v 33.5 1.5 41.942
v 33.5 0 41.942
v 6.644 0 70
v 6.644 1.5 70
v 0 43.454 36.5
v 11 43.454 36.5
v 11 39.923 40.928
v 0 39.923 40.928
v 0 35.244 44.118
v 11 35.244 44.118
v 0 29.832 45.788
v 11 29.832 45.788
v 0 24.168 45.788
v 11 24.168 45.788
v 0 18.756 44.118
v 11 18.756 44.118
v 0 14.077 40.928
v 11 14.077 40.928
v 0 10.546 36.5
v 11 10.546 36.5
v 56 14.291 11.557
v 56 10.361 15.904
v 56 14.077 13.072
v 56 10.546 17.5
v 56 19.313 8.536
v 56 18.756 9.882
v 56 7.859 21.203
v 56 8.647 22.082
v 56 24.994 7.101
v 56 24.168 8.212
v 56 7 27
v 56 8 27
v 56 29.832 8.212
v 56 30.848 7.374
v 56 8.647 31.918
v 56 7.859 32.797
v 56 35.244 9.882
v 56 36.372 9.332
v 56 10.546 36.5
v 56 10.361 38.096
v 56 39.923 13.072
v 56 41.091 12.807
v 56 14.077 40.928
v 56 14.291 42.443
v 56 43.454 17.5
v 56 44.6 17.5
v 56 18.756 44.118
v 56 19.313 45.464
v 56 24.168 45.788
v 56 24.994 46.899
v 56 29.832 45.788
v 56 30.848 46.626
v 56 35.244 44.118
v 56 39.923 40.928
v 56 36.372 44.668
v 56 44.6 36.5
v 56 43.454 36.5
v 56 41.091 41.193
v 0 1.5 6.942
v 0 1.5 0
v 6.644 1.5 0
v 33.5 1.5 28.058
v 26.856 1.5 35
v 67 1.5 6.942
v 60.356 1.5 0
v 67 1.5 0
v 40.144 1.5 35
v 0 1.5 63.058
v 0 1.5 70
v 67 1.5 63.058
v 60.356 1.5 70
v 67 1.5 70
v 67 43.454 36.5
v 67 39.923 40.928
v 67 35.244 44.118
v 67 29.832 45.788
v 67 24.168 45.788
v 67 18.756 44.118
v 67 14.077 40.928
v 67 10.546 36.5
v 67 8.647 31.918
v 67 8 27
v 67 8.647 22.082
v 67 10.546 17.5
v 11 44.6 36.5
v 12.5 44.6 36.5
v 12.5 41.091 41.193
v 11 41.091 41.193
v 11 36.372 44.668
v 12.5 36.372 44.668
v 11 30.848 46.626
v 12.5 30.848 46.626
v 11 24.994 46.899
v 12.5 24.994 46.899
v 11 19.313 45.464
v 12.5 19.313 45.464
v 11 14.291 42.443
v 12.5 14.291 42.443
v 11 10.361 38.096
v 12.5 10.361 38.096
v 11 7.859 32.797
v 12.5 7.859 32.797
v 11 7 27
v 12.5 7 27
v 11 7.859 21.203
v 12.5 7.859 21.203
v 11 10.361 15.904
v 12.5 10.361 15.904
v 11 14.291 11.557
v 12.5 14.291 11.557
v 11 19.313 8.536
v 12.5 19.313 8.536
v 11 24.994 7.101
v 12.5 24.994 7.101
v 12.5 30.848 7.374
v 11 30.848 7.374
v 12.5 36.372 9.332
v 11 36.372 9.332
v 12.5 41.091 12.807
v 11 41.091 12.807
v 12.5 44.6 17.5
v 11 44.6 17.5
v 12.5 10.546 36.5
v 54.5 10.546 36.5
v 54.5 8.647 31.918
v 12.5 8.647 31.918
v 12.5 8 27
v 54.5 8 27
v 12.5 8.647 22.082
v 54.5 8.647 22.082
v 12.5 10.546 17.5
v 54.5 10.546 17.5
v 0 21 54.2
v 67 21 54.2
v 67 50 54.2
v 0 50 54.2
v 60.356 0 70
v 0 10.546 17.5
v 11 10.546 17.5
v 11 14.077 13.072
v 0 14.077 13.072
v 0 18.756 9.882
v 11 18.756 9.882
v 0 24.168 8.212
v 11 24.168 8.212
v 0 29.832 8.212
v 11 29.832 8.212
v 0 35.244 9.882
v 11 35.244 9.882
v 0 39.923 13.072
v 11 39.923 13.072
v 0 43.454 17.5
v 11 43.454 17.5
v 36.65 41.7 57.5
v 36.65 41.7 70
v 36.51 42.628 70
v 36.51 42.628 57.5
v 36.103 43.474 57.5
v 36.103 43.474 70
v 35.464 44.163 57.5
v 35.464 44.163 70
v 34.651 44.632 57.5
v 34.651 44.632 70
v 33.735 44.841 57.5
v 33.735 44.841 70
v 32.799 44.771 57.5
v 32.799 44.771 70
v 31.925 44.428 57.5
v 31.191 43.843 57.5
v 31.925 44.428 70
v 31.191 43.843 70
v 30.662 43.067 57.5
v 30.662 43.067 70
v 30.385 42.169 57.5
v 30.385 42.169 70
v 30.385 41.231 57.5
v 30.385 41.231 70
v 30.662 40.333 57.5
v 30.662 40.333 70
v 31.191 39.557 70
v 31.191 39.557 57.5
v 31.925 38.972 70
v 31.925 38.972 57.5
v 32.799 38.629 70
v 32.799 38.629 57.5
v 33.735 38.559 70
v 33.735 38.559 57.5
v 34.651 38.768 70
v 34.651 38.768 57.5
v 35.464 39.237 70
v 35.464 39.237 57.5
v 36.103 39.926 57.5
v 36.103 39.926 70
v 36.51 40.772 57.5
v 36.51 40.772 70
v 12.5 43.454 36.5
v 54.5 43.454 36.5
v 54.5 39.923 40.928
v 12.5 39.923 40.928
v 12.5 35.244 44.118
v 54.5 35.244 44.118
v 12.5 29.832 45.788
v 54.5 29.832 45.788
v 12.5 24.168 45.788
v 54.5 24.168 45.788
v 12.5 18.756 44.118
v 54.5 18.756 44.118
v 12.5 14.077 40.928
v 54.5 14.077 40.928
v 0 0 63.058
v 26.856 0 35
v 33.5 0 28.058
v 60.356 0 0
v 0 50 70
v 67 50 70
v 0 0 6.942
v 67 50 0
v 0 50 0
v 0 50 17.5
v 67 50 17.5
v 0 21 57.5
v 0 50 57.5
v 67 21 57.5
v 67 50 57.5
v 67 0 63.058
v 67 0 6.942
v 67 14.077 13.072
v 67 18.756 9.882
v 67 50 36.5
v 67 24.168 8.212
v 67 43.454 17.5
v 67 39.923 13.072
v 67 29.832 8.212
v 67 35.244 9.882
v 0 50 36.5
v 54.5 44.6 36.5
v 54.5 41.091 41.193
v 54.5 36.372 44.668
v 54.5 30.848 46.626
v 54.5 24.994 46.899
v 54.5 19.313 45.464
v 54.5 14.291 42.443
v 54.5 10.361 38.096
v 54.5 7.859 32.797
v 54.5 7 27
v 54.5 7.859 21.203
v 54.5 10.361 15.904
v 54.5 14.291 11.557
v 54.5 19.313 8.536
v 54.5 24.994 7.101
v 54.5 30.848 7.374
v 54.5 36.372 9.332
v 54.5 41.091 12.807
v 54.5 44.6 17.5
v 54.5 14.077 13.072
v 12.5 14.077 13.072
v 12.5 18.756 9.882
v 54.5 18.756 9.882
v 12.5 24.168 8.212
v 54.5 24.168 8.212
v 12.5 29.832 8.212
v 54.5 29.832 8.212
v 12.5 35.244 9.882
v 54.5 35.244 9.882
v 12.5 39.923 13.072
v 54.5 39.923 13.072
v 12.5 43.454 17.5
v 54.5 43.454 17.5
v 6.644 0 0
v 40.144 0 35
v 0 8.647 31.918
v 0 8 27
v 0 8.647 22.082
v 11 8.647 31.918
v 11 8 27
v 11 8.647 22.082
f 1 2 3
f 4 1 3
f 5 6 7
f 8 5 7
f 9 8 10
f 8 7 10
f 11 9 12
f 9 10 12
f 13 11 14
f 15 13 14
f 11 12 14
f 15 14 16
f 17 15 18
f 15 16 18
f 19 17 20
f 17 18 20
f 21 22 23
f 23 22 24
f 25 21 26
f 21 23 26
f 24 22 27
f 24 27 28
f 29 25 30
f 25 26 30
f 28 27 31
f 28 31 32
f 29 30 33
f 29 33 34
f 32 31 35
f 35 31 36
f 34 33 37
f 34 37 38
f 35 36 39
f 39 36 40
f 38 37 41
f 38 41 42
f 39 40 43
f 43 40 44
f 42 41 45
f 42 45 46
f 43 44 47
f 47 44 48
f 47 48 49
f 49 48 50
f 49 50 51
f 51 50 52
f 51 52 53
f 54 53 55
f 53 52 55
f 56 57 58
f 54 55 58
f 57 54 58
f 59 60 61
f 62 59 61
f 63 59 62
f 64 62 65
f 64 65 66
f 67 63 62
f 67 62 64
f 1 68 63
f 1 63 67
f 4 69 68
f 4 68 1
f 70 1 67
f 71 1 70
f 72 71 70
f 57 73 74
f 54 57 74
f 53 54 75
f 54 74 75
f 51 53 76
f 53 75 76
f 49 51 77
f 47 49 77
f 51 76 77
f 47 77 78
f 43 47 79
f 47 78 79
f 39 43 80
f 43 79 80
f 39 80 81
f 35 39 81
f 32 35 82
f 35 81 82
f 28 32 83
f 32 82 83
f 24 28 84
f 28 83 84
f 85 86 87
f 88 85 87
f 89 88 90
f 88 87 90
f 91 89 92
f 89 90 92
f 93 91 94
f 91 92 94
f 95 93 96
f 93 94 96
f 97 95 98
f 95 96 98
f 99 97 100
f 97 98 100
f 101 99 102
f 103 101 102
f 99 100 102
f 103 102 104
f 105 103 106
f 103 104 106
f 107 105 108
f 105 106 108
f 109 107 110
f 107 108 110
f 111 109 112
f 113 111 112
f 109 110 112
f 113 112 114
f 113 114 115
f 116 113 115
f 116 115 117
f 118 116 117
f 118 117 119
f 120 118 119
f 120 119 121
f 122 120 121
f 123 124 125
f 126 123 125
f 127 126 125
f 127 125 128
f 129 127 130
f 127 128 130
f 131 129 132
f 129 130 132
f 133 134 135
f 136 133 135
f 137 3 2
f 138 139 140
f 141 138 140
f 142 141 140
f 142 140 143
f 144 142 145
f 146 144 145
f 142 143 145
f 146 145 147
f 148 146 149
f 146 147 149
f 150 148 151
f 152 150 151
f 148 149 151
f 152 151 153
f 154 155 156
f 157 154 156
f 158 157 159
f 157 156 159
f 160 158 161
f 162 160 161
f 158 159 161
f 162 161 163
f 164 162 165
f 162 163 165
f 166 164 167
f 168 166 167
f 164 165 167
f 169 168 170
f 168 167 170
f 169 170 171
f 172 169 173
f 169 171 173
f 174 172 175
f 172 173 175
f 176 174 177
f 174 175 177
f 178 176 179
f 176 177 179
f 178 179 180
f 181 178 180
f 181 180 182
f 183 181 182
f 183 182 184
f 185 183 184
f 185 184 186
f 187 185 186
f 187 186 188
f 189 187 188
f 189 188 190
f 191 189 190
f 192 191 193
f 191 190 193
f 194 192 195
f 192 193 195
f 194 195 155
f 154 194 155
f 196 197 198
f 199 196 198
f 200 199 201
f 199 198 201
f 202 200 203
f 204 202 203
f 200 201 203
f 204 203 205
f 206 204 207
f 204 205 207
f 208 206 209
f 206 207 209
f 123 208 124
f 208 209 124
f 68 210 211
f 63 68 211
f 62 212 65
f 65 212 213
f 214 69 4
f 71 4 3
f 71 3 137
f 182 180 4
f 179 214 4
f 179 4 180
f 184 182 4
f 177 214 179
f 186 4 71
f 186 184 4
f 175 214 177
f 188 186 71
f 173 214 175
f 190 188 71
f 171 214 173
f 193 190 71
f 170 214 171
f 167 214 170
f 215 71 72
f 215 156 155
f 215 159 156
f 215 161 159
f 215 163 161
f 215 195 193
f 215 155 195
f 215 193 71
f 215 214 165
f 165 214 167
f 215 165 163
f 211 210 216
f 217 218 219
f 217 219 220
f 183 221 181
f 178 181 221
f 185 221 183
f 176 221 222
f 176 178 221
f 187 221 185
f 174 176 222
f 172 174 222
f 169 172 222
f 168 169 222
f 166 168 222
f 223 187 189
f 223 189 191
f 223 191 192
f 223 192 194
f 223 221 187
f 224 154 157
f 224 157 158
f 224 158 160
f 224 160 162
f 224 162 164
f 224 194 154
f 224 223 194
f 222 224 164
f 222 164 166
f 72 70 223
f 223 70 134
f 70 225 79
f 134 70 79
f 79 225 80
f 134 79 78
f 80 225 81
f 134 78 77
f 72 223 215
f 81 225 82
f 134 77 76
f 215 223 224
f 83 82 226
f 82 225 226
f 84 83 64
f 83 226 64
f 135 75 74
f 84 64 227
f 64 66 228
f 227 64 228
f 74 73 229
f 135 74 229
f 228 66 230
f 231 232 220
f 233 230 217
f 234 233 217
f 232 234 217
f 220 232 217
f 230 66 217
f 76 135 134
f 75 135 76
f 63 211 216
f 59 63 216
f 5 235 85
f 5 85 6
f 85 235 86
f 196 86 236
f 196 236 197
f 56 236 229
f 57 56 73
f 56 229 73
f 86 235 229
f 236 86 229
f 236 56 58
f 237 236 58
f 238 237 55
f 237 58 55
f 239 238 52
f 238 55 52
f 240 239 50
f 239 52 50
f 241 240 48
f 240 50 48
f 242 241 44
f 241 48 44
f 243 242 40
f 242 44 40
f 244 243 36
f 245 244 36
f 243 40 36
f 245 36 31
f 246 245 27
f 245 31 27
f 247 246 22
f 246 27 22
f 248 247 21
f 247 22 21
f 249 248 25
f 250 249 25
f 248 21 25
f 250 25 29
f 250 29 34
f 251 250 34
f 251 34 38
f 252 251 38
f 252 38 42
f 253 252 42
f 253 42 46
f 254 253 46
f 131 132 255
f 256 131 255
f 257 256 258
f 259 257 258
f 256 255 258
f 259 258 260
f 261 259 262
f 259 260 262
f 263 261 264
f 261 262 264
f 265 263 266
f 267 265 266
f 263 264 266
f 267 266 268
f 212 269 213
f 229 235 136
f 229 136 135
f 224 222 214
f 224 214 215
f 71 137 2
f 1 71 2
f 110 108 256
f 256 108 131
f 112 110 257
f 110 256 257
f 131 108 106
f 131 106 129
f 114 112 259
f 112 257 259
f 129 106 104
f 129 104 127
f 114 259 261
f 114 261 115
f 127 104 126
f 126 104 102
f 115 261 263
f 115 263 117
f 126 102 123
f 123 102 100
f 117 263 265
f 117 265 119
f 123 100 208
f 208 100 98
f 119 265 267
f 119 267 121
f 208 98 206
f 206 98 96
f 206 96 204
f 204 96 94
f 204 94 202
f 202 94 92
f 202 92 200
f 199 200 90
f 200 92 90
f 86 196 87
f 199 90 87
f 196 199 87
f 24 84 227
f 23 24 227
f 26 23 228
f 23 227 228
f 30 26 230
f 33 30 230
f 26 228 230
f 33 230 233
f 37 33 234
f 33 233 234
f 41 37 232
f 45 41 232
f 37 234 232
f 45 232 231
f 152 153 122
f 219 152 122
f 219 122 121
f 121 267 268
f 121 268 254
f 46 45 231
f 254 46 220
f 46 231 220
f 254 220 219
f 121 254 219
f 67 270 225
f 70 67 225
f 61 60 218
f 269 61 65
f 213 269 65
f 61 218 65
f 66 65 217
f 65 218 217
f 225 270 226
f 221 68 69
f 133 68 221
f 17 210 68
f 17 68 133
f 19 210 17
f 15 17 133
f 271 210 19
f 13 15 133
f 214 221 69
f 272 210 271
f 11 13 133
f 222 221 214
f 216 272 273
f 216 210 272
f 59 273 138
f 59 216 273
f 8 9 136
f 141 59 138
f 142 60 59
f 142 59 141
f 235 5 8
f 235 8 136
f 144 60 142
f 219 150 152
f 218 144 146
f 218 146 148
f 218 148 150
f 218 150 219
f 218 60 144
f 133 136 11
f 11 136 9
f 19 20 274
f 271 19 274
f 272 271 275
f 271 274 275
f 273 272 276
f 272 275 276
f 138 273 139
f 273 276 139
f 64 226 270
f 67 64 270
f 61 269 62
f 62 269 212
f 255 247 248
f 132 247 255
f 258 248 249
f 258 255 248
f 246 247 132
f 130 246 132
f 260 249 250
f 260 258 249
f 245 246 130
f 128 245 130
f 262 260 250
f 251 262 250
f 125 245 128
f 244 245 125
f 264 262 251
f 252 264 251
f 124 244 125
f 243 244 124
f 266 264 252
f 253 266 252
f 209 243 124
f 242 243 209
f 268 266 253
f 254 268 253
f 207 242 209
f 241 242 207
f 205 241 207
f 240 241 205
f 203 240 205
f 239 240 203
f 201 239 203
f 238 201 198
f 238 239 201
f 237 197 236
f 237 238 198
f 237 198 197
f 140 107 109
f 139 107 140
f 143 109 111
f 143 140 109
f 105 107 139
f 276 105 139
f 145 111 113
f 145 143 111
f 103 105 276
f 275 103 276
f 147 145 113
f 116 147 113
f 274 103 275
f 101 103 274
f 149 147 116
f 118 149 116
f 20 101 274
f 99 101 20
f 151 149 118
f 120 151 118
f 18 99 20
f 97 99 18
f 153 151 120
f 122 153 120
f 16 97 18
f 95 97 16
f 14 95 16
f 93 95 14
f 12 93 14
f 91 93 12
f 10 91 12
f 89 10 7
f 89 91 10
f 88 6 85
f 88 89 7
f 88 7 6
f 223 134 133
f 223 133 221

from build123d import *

# Parameters (mm, degrees)
F0_W      = 67
F0_H      = 50
F1_DEPTH  = 70
F2_W      = 29
F2_H      = 3.3
F3_DEPTH  = 67.001
F4_R      = 3.15
F5_DEPTH  = 12.5
F7_DEPTH  = 1.5
F9_DEPTH  = 67.001
F11_R     = 20
F12_DEPTH = 1.5
F14_R     = 20
F15_DEPTH = 1.5


with BuildPart() as f1:
    # F0 (on Top) → F1 (new body)
    with BuildSketch(Plane.XY):
        with Locations((33.5, 25)):
            Rectangle(F0_W, F0_H)
    extrude(amount=F1_DEPTH)

    # F2 (on face) → F3 (cut, through all)
    with BuildSketch(Plane.YZ.offset(67)):
        with Locations((35.5, 55.85)):
            Rectangle(F2_W, F2_H)
    extrude(amount=-F3_DEPTH, mode=Mode.SUBTRACT)

    # F4 (on face) → F5 (cut, through all)
    with BuildSketch(Plane.XY.offset(70)):
        with Locations((33.5, 41.7)):
            Circle(F4_R)
    extrude(amount=-F5_DEPTH, mode=Mode.SUBTRACT)

    # F6 (on face) → F7 (cut)
    with BuildSketch(Plane.XZ):
        Polygon((0, 6.9418640507), (0, 0), (30.1778222043, 31.5290679747), (26.8556444086, 35), align=None)
        Polygon((30.1778222043, 31.5290679747), (0, 0), (6.6443555914, 0), (33.5, 28.0581359493), align=None)
        Polygon((26.8556444086, 35), (30.1778222043, 31.5290679747), (33.5, 35), (30.1778222043, 38.4709320253), align=None)
        Polygon((33.5, 35), (30.1778222043, 31.5290679747), (33.5, 28.0581359493), (36.8221777957, 31.5290679747), align=None)
        Polygon((30.1778222043, 38.4709320253), (33.5, 35), (36.8221777957, 38.4709320253), (33.5, 41.9418640507), align=None)
        Polygon((36.8221777957, 38.4709320253), (33.5, 35), (36.8221777957, 31.5290679747), (40.1443555914, 35), align=None)
        Polygon((0, 63.0581359493), (26.8556444086, 35), (30.1778222043, 38.4709320253), (0, 70), align=None)
        Polygon((36.8221777957, 31.5290679747), (33.5, 28.0581359493), (60.3556444086, 0), (67, 0), align=None)
        Polygon((33.5, 41.9418640507), (36.8221777957, 38.4709320253), (67, 70), (60.3556444086, 70), align=None)
        Polygon((67, 70), (36.8221777957, 38.4709320253), (40.1443555914, 35), (67, 63.0581359493), align=None)
        Polygon((0, 70), (30.1778222043, 38.4709320253), (33.5, 41.9418640507), (6.6443555914, 70), align=None)
        Polygon((40.1443555914, 35), (36.8221777957, 31.5290679747), (67, 0), (67, 6.9418640507), align=None)
    extrude(amount=-F7_DEPTH, mode=Mode.SUBTRACT)

    # F8 (on face) → F9 (cut, through all)
    with BuildSketch(Plane.YZ.offset(67)):
        with BuildLine():
            Line((43.4544826719, 36.5), (10.5455173281, 36.5))
            ThreePointArc((10.5455173281, 36.5), (8, 27), (10.5455173281, 17.5))
            Line((10.5455173281, 17.5), (43.4544826719, 17.5))
            ThreePointArc((43.4544826719, 17.5), (45.3525906995, 22.0824381431), (46, 27))
            ThreePointArc((46, 27), (45.3525906995, 31.9175618569), (43.4544826719, 36.5))
        make_face()
        with BuildLine():
            ThreePointArc((43.4544826719, 36.5), (27, 46), (10.5455173281, 36.5))
            Line((10.5455173281, 36.5), (43.4544826719, 36.5))
        make_face()
        with BuildLine():
            Line((43.4544826719, 17.5), (10.5455173281, 17.5))
            ThreePointArc((10.5455173281, 17.5), (27, 8), (43.4544826719, 17.5))
        make_face()
        with BuildLine():
            Line((50, 36.5), (43.4544826719, 36.5))
            ThreePointArc((43.4544826719, 36.5), (45.3525906995, 31.9175618569), (46, 27))
            Line((46, 27), (50, 27))
            Line((50, 27), (50, 36.5))
        make_face()
        with BuildLine():
            ThreePointArc((46, 27), (45.3525906995, 22.0824381431), (43.4544826719, 17.5))
            Line((43.4544826719, 17.5), (50, 17.5))
            Line((50, 17.5), (50, 27))
            Line((50, 27), (46, 27))
        make_face()
    extrude(amount=-F9_DEPTH, mode=Mode.SUBTRACT)

    # F11 (on offset) → F12 (cut)
    with BuildSketch(Plane.YZ.offset(56)):
        with Locations((27, 27)):
            Circle(F11_R)
    extrude(amount=-F12_DEPTH, mode=Mode.SUBTRACT)

    # F14 (on offset) → F15 (cut)
    with BuildSketch(Plane.YZ.offset(12.5)):
        with Locations((27, 27)):
            Circle(F14_R)
    extrude(amount=-F15_DEPTH, mode=Mode.SUBTRACT)


solid = f1.part
